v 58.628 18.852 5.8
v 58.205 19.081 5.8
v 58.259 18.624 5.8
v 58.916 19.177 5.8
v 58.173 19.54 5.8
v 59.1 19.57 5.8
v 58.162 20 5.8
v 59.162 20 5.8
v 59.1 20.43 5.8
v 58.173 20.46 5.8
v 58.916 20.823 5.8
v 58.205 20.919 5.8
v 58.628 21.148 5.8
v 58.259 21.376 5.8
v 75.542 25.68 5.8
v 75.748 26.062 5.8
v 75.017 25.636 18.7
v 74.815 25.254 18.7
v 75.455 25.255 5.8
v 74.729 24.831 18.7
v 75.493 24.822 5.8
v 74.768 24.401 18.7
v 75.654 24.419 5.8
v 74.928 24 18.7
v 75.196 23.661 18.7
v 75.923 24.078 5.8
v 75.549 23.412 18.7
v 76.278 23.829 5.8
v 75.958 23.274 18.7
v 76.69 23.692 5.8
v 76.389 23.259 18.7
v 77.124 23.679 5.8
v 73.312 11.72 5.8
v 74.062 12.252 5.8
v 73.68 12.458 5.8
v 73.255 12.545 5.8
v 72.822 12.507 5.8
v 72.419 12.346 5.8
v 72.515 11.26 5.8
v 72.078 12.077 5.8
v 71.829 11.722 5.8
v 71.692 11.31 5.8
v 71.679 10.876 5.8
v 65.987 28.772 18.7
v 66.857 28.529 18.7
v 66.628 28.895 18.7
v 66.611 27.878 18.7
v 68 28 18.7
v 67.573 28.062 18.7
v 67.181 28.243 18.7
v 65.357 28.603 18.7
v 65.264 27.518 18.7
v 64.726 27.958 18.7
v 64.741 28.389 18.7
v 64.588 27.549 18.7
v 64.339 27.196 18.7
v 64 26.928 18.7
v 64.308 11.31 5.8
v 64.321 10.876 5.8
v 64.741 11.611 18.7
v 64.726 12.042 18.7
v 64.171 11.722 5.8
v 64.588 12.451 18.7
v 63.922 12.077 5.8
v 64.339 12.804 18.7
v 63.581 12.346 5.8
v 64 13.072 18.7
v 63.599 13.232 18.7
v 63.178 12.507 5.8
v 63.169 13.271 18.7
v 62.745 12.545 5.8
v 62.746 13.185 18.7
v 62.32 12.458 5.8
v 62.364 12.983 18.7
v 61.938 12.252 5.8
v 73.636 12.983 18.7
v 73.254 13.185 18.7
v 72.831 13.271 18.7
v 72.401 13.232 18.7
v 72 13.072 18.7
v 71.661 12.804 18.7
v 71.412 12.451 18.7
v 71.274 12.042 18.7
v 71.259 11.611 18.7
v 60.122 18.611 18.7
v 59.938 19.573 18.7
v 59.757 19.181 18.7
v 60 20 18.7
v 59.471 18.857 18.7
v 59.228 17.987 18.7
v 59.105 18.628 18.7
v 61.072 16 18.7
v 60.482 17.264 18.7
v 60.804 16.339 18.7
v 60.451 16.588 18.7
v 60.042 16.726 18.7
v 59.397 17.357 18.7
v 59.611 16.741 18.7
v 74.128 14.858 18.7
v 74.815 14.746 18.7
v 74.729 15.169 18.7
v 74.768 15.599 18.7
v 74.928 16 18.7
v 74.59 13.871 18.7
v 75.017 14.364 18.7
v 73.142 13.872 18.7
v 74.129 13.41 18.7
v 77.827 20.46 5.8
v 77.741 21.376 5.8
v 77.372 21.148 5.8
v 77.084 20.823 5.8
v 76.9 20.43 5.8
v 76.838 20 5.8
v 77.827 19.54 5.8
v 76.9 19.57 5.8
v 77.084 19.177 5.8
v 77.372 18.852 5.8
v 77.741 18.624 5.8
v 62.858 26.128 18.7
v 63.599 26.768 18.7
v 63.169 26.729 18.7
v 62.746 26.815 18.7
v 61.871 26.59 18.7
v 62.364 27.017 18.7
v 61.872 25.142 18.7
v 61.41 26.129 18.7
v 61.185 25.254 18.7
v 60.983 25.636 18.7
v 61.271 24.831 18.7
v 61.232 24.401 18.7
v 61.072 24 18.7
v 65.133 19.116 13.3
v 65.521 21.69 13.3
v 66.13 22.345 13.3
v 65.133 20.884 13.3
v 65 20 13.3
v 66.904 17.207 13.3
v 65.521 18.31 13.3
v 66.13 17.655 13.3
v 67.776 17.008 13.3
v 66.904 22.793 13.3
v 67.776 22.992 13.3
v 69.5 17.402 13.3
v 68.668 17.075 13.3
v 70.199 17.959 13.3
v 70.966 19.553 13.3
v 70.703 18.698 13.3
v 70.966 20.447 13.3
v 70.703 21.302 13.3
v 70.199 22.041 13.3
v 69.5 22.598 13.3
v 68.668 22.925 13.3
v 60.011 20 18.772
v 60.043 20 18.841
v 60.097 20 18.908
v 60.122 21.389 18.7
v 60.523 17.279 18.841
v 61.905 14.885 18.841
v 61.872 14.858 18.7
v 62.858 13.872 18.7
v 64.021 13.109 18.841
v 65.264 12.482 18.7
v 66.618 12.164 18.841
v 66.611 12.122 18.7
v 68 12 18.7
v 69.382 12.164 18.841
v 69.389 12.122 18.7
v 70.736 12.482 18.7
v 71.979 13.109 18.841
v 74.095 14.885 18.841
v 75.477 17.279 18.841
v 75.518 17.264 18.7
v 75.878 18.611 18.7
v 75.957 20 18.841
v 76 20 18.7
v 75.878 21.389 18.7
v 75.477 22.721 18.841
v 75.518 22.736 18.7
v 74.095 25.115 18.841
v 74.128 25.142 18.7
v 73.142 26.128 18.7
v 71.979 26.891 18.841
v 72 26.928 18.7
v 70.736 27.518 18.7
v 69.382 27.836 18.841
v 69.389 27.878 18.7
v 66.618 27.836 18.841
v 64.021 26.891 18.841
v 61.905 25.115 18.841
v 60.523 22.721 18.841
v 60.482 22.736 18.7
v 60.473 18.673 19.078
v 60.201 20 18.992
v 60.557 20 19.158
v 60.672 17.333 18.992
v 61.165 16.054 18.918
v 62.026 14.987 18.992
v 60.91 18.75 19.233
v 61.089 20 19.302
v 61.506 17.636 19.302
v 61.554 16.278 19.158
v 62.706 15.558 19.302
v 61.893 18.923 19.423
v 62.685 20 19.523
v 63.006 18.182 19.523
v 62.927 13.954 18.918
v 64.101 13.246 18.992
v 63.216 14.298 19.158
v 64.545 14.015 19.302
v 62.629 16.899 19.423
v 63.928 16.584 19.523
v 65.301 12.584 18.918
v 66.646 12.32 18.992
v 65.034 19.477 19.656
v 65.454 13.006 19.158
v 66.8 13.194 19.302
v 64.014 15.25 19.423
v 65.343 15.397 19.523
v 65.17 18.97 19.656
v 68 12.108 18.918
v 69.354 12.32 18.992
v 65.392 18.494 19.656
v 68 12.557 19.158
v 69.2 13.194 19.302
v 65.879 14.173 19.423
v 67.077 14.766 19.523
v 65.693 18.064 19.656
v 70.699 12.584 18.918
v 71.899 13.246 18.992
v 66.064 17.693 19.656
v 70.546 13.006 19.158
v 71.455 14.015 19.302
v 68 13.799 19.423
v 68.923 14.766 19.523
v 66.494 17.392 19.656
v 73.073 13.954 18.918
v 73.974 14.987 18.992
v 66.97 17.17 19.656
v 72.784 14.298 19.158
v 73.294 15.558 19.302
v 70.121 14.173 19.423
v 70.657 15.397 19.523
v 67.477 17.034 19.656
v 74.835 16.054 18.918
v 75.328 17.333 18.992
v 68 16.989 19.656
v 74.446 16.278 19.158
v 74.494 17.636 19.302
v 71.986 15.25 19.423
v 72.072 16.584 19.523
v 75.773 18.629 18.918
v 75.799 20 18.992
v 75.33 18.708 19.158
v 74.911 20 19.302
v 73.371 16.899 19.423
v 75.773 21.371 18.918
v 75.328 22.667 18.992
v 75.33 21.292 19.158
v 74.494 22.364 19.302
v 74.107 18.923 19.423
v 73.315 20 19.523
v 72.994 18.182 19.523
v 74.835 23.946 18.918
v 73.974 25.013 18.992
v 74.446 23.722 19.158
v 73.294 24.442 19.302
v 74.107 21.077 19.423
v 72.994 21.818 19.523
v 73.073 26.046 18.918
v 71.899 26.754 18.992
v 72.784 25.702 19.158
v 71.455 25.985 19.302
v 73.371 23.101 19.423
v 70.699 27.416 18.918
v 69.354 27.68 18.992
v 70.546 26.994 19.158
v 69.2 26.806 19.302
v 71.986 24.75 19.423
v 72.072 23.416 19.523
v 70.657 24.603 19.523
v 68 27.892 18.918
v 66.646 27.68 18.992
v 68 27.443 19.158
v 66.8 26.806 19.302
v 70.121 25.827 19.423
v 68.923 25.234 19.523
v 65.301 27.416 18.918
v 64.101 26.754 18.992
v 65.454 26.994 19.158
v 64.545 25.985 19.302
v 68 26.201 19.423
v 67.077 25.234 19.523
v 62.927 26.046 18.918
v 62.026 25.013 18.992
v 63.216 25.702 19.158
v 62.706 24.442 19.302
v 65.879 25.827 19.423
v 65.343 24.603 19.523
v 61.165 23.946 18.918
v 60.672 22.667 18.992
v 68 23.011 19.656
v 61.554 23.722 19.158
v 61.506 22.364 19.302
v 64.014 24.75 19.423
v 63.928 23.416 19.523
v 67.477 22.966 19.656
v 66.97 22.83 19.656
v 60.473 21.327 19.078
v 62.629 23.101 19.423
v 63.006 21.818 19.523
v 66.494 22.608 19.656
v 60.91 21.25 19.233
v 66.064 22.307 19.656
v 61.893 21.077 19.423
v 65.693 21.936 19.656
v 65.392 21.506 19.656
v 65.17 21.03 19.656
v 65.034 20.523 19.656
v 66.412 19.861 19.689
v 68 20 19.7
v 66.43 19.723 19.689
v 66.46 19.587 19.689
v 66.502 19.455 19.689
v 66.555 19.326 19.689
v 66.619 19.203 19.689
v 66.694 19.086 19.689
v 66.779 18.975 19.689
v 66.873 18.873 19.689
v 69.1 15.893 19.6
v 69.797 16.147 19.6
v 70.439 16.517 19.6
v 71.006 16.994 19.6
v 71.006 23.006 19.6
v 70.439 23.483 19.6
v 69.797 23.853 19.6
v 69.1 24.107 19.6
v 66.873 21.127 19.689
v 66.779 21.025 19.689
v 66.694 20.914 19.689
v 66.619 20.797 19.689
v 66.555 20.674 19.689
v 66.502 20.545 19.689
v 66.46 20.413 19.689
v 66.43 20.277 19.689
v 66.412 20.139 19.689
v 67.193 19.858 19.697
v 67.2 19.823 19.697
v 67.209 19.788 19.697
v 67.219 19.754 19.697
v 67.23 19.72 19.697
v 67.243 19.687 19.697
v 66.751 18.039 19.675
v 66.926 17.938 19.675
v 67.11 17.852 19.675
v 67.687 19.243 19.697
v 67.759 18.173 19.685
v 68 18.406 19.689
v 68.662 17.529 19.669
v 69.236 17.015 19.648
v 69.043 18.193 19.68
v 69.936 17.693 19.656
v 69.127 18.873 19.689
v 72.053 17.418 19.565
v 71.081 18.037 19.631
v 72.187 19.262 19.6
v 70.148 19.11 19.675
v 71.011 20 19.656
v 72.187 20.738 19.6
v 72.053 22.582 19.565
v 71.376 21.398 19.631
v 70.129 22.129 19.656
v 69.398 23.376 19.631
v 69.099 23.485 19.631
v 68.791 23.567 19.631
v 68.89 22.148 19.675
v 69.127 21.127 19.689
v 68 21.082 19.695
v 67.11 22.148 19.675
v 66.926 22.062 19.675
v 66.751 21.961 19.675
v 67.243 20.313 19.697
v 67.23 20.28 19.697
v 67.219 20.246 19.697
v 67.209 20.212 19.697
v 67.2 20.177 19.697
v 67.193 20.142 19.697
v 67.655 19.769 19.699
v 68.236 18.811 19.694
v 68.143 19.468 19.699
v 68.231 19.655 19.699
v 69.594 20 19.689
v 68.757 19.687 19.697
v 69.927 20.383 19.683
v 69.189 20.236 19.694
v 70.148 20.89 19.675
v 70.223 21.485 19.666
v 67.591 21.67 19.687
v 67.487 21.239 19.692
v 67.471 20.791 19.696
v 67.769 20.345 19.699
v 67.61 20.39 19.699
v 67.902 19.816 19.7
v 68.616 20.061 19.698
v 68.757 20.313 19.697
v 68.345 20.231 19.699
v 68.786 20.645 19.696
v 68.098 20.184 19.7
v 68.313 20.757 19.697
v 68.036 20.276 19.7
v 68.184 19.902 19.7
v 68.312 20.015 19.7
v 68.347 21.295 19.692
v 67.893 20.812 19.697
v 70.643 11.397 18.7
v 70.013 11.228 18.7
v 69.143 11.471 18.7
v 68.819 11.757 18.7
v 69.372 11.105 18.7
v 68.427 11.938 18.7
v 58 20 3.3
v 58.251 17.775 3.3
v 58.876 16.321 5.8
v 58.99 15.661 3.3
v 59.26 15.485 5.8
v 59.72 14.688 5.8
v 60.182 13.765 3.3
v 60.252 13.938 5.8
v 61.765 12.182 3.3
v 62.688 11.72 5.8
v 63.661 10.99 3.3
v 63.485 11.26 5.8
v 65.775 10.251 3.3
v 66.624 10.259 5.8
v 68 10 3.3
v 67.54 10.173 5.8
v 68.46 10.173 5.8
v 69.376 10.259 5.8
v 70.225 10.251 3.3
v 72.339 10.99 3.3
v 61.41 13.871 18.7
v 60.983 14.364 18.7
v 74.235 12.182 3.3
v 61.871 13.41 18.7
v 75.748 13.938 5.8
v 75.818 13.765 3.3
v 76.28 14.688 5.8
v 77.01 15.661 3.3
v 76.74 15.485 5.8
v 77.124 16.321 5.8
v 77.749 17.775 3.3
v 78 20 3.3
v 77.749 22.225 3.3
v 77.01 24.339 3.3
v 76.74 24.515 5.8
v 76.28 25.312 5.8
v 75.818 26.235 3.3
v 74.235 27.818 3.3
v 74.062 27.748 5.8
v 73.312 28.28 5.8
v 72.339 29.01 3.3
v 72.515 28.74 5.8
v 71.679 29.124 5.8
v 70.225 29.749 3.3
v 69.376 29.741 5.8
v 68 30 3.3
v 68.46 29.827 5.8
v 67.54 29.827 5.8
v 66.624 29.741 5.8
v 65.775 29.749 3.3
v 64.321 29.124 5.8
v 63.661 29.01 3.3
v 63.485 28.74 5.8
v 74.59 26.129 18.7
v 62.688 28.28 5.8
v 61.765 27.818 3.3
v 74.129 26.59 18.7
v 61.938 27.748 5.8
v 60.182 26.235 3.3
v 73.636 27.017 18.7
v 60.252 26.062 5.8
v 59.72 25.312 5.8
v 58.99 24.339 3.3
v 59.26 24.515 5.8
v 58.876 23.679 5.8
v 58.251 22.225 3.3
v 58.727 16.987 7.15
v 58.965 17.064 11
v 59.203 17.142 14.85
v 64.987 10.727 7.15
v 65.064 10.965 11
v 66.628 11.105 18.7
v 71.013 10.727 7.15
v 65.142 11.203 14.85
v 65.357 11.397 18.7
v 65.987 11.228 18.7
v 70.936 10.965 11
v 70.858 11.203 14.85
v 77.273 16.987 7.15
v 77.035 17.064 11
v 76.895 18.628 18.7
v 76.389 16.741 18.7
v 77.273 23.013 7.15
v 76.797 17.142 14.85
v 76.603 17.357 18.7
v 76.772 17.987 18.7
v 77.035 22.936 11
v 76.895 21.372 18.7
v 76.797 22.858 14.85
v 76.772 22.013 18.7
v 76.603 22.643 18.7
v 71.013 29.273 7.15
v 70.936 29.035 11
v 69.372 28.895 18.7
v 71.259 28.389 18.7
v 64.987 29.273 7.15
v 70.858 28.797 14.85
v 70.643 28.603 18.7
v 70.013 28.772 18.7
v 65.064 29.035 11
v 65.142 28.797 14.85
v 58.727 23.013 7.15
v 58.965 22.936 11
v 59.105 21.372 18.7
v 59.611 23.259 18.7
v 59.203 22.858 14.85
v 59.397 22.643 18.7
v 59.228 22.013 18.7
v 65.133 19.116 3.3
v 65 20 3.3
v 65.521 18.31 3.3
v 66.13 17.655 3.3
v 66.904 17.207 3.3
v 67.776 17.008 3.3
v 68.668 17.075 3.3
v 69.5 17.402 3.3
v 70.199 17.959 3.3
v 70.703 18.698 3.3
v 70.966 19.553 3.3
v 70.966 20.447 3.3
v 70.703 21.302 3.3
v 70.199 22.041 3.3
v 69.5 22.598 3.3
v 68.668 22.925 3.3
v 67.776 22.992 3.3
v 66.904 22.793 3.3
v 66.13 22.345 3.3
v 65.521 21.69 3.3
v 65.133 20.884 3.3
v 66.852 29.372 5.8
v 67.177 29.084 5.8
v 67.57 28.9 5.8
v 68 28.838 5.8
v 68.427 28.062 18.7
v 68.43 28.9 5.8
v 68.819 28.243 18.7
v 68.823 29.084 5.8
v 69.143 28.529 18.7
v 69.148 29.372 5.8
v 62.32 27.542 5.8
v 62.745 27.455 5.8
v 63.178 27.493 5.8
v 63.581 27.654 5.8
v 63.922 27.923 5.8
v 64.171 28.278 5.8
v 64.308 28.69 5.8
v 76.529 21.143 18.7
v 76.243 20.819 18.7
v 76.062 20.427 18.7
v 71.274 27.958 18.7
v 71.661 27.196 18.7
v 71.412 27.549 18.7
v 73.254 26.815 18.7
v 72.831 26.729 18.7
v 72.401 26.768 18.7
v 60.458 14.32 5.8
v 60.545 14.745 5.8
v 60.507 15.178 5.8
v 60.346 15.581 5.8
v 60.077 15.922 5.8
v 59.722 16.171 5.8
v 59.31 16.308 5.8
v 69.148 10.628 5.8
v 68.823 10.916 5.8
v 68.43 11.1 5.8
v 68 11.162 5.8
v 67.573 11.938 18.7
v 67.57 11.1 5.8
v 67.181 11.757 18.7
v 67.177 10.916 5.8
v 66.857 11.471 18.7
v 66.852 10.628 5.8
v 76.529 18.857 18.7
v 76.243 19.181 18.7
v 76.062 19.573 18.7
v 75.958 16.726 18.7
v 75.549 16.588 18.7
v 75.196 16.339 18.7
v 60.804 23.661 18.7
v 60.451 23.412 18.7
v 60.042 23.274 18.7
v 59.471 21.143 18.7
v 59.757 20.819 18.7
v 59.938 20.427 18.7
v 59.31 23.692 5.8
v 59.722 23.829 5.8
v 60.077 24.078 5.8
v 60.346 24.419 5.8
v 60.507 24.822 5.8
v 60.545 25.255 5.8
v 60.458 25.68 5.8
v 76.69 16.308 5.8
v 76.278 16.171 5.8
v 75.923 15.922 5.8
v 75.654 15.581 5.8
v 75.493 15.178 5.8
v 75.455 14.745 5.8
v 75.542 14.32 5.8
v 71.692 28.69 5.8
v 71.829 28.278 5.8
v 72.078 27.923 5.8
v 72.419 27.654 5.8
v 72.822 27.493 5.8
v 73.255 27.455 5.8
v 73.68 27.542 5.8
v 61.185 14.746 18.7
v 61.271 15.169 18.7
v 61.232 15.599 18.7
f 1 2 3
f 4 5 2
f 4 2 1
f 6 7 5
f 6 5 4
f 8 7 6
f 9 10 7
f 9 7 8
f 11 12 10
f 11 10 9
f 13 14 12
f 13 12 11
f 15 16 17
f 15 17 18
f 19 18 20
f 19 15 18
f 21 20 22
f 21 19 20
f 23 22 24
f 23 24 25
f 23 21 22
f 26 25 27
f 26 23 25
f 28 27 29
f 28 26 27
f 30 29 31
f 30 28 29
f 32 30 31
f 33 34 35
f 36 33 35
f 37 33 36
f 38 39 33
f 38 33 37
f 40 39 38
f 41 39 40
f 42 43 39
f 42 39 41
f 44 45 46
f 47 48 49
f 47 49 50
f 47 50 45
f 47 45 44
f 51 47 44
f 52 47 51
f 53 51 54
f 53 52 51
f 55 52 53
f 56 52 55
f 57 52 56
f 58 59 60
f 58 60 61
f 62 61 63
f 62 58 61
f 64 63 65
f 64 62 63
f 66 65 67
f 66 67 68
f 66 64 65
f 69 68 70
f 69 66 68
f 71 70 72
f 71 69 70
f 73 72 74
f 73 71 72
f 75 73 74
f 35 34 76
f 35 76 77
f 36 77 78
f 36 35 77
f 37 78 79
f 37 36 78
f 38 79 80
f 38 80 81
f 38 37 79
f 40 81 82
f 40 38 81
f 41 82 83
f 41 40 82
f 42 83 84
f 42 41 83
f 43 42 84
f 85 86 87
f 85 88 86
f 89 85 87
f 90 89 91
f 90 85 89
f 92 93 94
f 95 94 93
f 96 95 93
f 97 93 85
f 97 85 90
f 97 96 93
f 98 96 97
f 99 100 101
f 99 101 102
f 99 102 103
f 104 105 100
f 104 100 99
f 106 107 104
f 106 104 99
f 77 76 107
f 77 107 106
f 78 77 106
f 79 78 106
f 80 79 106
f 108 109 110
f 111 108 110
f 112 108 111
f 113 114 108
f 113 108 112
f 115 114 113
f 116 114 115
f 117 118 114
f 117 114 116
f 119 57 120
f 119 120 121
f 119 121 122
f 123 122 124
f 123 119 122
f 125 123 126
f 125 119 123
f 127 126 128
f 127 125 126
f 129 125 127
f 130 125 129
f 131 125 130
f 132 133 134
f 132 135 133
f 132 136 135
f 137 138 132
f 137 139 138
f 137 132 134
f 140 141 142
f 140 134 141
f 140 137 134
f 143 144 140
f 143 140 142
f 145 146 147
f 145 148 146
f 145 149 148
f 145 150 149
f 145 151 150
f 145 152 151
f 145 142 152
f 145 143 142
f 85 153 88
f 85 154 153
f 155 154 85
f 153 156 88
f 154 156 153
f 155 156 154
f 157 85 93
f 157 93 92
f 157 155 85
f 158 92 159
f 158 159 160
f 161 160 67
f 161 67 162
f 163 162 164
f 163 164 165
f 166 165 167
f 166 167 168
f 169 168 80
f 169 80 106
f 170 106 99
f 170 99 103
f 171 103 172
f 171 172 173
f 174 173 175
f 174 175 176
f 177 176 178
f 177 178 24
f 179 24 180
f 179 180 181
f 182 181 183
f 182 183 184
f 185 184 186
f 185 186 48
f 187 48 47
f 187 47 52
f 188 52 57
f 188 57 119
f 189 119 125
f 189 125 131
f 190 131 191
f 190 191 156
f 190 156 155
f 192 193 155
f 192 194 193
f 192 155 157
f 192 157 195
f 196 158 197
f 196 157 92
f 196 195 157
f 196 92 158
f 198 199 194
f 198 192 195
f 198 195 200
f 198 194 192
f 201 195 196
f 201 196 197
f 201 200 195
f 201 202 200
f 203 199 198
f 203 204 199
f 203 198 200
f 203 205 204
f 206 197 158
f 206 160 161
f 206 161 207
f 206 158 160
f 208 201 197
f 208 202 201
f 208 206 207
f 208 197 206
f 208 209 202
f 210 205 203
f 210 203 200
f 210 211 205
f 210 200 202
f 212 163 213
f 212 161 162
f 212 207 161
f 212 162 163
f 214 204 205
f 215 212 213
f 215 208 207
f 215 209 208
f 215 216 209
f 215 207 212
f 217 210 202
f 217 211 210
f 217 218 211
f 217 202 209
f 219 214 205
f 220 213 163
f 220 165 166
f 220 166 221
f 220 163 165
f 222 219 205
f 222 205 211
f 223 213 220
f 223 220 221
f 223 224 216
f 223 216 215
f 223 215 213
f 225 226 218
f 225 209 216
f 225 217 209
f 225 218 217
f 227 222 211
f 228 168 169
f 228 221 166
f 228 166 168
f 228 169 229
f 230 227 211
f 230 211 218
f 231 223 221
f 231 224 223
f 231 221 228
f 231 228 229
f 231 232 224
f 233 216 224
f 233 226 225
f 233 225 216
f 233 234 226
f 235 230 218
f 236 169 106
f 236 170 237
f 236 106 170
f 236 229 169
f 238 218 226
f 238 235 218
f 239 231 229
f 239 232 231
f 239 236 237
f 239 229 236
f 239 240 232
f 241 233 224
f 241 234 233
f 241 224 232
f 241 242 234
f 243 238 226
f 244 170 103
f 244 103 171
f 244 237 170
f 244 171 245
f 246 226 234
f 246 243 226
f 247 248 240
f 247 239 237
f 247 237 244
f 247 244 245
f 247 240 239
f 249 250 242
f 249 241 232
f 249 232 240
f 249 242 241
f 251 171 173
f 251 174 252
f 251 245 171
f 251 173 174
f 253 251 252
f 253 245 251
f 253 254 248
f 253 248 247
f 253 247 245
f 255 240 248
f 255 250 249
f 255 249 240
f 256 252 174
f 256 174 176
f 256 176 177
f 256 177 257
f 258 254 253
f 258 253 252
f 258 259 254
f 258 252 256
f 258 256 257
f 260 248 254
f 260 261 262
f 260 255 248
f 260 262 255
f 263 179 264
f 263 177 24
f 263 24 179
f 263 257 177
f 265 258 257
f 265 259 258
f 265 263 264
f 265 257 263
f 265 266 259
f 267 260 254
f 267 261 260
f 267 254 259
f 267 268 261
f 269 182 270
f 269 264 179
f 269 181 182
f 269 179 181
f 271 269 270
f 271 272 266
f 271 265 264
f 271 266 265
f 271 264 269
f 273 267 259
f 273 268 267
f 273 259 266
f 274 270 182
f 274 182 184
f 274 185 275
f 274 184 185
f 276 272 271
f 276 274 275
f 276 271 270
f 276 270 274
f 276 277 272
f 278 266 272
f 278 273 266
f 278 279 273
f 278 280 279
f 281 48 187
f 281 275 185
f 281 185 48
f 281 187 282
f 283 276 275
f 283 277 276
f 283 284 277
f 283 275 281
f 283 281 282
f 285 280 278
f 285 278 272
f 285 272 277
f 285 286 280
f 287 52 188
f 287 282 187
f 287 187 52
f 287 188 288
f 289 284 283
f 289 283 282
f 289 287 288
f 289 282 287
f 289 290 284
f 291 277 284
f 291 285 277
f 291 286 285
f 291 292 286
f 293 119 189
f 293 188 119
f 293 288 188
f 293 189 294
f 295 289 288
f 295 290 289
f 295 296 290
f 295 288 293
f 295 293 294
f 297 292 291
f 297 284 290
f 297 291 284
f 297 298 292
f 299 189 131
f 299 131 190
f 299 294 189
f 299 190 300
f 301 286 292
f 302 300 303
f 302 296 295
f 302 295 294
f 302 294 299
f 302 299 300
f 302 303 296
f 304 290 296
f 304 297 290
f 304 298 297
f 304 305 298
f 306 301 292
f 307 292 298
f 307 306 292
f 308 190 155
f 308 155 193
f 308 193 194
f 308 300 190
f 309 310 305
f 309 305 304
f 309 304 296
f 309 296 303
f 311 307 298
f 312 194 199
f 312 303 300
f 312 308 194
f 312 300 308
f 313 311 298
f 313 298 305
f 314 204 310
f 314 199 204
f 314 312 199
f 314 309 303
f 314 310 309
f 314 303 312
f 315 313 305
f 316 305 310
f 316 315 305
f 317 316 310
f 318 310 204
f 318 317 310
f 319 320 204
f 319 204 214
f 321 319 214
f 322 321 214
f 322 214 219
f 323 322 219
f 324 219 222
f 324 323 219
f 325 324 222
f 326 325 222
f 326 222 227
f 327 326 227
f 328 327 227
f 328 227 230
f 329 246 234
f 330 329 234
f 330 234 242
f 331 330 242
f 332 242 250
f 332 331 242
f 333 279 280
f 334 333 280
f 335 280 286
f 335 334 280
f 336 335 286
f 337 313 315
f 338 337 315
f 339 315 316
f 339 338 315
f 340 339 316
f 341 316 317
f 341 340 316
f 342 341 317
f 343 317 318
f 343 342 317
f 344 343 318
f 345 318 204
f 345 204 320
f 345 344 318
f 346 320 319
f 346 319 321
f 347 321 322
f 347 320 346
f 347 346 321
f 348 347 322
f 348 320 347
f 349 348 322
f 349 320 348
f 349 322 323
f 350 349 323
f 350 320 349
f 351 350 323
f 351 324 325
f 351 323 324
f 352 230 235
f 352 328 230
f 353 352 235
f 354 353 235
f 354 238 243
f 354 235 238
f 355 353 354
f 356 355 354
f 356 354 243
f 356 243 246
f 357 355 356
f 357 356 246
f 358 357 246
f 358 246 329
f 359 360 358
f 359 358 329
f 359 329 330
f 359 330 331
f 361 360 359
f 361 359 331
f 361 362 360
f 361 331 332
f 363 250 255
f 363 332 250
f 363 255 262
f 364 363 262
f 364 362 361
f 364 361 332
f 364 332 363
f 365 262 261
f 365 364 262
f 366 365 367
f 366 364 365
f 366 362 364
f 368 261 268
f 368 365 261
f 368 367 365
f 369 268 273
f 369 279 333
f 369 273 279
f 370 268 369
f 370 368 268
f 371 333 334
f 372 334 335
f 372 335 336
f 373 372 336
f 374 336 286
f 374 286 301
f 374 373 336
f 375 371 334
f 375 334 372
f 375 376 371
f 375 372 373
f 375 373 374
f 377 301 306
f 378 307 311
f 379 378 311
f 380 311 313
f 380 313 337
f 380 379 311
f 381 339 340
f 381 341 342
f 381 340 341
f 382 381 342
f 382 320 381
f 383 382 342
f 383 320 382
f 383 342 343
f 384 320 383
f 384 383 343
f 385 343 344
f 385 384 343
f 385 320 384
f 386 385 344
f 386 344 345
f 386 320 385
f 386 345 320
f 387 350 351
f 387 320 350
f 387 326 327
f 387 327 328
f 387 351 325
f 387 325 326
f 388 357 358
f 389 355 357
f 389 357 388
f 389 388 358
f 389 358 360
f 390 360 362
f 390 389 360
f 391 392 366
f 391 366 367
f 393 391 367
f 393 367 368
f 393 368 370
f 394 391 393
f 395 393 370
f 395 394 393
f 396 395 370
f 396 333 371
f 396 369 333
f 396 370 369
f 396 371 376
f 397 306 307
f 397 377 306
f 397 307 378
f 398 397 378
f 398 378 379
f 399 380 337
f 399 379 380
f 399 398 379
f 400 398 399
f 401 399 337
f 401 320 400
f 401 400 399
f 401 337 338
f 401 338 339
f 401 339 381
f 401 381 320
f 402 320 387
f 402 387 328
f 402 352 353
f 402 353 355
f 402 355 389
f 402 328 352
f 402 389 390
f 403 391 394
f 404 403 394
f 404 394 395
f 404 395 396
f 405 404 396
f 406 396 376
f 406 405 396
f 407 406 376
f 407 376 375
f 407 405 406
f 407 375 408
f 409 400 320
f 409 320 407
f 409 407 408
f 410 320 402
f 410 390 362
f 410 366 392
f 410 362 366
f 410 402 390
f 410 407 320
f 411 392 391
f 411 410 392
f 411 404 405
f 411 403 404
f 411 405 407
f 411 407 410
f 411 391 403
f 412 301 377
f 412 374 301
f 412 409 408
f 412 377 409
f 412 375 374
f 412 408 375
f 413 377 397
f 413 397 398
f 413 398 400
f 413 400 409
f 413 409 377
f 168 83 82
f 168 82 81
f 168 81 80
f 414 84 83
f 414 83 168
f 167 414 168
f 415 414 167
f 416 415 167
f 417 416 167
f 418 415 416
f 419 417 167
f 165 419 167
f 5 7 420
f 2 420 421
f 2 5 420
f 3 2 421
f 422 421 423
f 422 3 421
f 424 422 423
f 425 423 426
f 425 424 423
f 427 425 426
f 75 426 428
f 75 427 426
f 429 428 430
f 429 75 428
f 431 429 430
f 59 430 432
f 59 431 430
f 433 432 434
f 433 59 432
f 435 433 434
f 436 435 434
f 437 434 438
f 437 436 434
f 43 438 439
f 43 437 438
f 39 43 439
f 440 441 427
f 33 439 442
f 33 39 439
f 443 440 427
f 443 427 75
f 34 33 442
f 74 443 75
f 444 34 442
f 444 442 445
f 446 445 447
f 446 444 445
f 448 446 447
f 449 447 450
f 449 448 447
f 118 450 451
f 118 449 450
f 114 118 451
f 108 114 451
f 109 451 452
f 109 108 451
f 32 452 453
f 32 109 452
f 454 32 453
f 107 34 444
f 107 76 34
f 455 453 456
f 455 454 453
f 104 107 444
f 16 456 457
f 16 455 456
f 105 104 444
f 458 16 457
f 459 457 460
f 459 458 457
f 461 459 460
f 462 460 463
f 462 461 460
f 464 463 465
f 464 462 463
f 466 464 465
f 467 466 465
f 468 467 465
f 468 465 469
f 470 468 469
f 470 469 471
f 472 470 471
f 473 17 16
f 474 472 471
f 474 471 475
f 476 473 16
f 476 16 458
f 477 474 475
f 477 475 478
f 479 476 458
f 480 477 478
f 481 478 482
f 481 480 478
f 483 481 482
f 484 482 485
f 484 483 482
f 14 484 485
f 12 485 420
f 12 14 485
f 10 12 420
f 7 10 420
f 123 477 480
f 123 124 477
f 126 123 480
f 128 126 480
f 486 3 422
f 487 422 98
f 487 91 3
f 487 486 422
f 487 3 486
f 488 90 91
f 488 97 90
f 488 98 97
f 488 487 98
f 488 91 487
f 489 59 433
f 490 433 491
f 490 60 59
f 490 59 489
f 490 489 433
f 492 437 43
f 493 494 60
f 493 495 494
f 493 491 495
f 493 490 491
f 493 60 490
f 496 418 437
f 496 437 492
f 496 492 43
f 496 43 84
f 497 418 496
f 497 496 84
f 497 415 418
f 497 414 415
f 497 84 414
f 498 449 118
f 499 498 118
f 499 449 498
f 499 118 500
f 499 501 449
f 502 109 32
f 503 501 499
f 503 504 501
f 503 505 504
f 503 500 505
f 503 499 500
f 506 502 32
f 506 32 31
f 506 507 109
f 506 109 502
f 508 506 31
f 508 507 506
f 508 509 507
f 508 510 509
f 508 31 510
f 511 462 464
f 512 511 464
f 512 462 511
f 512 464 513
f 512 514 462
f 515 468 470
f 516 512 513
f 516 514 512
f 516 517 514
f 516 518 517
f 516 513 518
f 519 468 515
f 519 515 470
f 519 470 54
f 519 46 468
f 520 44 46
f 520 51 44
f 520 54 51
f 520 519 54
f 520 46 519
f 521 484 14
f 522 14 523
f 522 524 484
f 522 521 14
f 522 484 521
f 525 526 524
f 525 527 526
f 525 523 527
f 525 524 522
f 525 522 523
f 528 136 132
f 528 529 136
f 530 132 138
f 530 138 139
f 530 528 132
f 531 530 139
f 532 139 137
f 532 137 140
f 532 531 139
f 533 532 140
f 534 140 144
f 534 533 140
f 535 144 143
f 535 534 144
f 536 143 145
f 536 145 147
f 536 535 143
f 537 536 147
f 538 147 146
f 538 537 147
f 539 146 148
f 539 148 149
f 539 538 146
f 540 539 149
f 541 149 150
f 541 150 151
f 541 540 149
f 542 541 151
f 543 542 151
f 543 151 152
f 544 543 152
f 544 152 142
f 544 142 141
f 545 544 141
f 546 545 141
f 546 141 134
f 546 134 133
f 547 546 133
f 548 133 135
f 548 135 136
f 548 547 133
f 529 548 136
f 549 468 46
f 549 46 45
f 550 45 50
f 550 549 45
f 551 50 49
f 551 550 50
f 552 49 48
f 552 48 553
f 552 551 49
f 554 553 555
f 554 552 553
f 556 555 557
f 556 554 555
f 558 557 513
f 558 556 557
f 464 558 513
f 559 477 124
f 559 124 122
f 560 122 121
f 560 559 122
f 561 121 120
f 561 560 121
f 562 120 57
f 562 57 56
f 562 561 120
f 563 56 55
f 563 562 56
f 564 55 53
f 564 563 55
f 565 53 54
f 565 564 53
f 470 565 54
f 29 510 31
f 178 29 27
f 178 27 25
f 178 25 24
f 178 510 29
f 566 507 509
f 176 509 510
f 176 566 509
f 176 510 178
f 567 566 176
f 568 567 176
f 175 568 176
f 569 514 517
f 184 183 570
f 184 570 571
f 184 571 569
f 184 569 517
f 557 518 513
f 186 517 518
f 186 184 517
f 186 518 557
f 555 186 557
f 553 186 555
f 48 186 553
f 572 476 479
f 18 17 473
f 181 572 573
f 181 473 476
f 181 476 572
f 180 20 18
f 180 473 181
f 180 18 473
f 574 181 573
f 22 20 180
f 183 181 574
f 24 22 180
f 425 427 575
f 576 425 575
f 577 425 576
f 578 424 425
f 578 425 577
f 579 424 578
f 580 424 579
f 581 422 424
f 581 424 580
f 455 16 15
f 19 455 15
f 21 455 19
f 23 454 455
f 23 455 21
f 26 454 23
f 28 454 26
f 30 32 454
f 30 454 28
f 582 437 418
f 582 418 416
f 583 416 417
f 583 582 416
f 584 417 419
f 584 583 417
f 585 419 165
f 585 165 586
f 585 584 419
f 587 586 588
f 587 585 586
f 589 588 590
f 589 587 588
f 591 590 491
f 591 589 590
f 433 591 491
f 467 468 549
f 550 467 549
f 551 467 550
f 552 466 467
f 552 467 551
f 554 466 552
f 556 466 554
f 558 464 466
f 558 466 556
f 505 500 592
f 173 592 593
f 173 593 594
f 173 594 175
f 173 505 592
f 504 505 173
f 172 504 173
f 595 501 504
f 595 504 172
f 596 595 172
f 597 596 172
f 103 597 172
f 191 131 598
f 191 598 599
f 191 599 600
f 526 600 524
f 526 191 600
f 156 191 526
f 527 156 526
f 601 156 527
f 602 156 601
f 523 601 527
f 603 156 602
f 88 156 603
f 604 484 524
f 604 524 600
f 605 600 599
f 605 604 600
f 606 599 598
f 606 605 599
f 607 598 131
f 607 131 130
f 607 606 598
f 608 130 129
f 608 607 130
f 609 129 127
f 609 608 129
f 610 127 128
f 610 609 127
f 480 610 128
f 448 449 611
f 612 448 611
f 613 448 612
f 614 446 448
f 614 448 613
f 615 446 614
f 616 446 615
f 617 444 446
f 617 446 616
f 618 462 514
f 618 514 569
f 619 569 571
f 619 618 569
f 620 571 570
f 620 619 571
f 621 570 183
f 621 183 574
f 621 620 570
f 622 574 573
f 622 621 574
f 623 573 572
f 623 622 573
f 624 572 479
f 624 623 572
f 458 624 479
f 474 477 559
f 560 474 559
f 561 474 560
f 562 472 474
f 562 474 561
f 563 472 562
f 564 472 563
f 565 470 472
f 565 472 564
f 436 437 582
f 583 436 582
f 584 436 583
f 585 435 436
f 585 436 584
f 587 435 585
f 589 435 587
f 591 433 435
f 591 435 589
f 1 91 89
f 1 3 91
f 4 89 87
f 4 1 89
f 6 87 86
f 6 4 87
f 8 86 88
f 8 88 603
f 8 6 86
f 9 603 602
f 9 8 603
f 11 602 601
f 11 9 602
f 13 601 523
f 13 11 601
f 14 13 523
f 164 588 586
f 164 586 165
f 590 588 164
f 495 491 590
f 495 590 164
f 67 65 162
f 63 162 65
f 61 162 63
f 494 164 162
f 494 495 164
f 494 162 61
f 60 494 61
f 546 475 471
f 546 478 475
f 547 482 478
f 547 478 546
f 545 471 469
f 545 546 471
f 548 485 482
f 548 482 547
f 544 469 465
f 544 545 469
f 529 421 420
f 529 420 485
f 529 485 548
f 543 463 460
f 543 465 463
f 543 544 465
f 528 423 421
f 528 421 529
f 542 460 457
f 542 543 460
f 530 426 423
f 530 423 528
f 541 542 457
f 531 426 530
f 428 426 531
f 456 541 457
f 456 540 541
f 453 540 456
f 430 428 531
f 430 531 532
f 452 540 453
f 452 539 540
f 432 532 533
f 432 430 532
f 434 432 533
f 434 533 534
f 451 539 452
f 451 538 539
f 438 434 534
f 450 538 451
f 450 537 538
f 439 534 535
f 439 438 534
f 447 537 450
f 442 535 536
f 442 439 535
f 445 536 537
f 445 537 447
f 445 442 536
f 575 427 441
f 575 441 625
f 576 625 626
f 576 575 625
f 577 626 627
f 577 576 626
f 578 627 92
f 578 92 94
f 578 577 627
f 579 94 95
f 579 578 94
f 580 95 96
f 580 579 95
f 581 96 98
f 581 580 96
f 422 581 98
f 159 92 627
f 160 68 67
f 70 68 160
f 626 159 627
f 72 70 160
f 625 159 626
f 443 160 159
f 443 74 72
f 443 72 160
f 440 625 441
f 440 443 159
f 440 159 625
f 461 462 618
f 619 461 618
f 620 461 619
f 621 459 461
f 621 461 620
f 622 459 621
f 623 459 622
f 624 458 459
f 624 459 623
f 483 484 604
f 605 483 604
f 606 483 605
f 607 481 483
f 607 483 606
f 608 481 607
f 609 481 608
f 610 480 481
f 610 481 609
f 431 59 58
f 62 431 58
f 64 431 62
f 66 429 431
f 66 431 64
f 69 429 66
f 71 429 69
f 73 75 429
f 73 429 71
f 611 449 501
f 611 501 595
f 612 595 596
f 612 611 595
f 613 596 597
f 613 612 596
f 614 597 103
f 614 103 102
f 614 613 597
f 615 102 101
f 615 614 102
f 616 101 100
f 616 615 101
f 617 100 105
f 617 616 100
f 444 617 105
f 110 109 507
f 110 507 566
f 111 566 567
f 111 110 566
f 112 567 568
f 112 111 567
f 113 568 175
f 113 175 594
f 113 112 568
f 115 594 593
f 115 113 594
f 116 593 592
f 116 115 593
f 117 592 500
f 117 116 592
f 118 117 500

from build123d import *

# Parameters (mm, degrees)
SKETCH015_R           = 1.5
POLARPATTERN001_COUNT = 12


with BuildPart() as part:
    # Sketch014 (on XZ_Plane006 of Origin012) → Revolution (revolve)
    with BuildSketch(Plane.XZ):
        Polygon((0, 10), (-3, 10), (-3, 0), (-10, 0), (-9, 15.4), (0, 15.4), align=None)
    revolve(axis=Axis((0, 0, 0), (0, 0, 1)))

    # SubtractivePipe: sweep along a path in Sketch016
    with BuildLine(Plane.XZ) as subtractivepipe_path:
        Line((-9, 15.4), (-9.837662, 2.5))
    # Sketch015 (on Face5 of Revolution) → SubtractivePipe (sweep, cut)
    with BuildSketch(Plane.XY.offset(15.4)):
        with Locations((-9.5, 0)):
            Circle(SKETCH015_R)
    subtractivepipe = sweep(path=subtractivepipe_path.line, mode=Mode.SUBTRACT)

    # PolarPattern001: SubtractivePipe ×12 about axis
    polarpattern001_axis = Axis((0, 0, 15.4), (0, 0, 1))
    for i in range(1, POLARPATTERN001_COUNT):
        add(subtractivepipe.rotate(polarpattern001_axis, i * 360 / POLARPATTERN001_COUNT), mode=Mode.SUBTRACT)

    # Sketch017 (on XZ_Plane006 of Origin012) → Revolution001 (revolve)
    with BuildSketch(Plane.XZ):
        with BuildLine():
            Line((0, 15.4), (-8, 15.4))
            add(Edge.make_bspline(
                [(-8, 15.4), (-8, 16.4), (0, 16.4)],
                knots=[0, 0, 0, 1, 1, 1], degree=2))
            Line((0, 16.4), (0, 15.4))
        make_face()
    revolve(axis=Axis((0, 0, 0), (0, 0, 1)))


with BuildPart() as part_1:
    # Body004 placement: moved
    add(part.part.moved(Location((68, 20, 3.3))))


solid = part_1.part
